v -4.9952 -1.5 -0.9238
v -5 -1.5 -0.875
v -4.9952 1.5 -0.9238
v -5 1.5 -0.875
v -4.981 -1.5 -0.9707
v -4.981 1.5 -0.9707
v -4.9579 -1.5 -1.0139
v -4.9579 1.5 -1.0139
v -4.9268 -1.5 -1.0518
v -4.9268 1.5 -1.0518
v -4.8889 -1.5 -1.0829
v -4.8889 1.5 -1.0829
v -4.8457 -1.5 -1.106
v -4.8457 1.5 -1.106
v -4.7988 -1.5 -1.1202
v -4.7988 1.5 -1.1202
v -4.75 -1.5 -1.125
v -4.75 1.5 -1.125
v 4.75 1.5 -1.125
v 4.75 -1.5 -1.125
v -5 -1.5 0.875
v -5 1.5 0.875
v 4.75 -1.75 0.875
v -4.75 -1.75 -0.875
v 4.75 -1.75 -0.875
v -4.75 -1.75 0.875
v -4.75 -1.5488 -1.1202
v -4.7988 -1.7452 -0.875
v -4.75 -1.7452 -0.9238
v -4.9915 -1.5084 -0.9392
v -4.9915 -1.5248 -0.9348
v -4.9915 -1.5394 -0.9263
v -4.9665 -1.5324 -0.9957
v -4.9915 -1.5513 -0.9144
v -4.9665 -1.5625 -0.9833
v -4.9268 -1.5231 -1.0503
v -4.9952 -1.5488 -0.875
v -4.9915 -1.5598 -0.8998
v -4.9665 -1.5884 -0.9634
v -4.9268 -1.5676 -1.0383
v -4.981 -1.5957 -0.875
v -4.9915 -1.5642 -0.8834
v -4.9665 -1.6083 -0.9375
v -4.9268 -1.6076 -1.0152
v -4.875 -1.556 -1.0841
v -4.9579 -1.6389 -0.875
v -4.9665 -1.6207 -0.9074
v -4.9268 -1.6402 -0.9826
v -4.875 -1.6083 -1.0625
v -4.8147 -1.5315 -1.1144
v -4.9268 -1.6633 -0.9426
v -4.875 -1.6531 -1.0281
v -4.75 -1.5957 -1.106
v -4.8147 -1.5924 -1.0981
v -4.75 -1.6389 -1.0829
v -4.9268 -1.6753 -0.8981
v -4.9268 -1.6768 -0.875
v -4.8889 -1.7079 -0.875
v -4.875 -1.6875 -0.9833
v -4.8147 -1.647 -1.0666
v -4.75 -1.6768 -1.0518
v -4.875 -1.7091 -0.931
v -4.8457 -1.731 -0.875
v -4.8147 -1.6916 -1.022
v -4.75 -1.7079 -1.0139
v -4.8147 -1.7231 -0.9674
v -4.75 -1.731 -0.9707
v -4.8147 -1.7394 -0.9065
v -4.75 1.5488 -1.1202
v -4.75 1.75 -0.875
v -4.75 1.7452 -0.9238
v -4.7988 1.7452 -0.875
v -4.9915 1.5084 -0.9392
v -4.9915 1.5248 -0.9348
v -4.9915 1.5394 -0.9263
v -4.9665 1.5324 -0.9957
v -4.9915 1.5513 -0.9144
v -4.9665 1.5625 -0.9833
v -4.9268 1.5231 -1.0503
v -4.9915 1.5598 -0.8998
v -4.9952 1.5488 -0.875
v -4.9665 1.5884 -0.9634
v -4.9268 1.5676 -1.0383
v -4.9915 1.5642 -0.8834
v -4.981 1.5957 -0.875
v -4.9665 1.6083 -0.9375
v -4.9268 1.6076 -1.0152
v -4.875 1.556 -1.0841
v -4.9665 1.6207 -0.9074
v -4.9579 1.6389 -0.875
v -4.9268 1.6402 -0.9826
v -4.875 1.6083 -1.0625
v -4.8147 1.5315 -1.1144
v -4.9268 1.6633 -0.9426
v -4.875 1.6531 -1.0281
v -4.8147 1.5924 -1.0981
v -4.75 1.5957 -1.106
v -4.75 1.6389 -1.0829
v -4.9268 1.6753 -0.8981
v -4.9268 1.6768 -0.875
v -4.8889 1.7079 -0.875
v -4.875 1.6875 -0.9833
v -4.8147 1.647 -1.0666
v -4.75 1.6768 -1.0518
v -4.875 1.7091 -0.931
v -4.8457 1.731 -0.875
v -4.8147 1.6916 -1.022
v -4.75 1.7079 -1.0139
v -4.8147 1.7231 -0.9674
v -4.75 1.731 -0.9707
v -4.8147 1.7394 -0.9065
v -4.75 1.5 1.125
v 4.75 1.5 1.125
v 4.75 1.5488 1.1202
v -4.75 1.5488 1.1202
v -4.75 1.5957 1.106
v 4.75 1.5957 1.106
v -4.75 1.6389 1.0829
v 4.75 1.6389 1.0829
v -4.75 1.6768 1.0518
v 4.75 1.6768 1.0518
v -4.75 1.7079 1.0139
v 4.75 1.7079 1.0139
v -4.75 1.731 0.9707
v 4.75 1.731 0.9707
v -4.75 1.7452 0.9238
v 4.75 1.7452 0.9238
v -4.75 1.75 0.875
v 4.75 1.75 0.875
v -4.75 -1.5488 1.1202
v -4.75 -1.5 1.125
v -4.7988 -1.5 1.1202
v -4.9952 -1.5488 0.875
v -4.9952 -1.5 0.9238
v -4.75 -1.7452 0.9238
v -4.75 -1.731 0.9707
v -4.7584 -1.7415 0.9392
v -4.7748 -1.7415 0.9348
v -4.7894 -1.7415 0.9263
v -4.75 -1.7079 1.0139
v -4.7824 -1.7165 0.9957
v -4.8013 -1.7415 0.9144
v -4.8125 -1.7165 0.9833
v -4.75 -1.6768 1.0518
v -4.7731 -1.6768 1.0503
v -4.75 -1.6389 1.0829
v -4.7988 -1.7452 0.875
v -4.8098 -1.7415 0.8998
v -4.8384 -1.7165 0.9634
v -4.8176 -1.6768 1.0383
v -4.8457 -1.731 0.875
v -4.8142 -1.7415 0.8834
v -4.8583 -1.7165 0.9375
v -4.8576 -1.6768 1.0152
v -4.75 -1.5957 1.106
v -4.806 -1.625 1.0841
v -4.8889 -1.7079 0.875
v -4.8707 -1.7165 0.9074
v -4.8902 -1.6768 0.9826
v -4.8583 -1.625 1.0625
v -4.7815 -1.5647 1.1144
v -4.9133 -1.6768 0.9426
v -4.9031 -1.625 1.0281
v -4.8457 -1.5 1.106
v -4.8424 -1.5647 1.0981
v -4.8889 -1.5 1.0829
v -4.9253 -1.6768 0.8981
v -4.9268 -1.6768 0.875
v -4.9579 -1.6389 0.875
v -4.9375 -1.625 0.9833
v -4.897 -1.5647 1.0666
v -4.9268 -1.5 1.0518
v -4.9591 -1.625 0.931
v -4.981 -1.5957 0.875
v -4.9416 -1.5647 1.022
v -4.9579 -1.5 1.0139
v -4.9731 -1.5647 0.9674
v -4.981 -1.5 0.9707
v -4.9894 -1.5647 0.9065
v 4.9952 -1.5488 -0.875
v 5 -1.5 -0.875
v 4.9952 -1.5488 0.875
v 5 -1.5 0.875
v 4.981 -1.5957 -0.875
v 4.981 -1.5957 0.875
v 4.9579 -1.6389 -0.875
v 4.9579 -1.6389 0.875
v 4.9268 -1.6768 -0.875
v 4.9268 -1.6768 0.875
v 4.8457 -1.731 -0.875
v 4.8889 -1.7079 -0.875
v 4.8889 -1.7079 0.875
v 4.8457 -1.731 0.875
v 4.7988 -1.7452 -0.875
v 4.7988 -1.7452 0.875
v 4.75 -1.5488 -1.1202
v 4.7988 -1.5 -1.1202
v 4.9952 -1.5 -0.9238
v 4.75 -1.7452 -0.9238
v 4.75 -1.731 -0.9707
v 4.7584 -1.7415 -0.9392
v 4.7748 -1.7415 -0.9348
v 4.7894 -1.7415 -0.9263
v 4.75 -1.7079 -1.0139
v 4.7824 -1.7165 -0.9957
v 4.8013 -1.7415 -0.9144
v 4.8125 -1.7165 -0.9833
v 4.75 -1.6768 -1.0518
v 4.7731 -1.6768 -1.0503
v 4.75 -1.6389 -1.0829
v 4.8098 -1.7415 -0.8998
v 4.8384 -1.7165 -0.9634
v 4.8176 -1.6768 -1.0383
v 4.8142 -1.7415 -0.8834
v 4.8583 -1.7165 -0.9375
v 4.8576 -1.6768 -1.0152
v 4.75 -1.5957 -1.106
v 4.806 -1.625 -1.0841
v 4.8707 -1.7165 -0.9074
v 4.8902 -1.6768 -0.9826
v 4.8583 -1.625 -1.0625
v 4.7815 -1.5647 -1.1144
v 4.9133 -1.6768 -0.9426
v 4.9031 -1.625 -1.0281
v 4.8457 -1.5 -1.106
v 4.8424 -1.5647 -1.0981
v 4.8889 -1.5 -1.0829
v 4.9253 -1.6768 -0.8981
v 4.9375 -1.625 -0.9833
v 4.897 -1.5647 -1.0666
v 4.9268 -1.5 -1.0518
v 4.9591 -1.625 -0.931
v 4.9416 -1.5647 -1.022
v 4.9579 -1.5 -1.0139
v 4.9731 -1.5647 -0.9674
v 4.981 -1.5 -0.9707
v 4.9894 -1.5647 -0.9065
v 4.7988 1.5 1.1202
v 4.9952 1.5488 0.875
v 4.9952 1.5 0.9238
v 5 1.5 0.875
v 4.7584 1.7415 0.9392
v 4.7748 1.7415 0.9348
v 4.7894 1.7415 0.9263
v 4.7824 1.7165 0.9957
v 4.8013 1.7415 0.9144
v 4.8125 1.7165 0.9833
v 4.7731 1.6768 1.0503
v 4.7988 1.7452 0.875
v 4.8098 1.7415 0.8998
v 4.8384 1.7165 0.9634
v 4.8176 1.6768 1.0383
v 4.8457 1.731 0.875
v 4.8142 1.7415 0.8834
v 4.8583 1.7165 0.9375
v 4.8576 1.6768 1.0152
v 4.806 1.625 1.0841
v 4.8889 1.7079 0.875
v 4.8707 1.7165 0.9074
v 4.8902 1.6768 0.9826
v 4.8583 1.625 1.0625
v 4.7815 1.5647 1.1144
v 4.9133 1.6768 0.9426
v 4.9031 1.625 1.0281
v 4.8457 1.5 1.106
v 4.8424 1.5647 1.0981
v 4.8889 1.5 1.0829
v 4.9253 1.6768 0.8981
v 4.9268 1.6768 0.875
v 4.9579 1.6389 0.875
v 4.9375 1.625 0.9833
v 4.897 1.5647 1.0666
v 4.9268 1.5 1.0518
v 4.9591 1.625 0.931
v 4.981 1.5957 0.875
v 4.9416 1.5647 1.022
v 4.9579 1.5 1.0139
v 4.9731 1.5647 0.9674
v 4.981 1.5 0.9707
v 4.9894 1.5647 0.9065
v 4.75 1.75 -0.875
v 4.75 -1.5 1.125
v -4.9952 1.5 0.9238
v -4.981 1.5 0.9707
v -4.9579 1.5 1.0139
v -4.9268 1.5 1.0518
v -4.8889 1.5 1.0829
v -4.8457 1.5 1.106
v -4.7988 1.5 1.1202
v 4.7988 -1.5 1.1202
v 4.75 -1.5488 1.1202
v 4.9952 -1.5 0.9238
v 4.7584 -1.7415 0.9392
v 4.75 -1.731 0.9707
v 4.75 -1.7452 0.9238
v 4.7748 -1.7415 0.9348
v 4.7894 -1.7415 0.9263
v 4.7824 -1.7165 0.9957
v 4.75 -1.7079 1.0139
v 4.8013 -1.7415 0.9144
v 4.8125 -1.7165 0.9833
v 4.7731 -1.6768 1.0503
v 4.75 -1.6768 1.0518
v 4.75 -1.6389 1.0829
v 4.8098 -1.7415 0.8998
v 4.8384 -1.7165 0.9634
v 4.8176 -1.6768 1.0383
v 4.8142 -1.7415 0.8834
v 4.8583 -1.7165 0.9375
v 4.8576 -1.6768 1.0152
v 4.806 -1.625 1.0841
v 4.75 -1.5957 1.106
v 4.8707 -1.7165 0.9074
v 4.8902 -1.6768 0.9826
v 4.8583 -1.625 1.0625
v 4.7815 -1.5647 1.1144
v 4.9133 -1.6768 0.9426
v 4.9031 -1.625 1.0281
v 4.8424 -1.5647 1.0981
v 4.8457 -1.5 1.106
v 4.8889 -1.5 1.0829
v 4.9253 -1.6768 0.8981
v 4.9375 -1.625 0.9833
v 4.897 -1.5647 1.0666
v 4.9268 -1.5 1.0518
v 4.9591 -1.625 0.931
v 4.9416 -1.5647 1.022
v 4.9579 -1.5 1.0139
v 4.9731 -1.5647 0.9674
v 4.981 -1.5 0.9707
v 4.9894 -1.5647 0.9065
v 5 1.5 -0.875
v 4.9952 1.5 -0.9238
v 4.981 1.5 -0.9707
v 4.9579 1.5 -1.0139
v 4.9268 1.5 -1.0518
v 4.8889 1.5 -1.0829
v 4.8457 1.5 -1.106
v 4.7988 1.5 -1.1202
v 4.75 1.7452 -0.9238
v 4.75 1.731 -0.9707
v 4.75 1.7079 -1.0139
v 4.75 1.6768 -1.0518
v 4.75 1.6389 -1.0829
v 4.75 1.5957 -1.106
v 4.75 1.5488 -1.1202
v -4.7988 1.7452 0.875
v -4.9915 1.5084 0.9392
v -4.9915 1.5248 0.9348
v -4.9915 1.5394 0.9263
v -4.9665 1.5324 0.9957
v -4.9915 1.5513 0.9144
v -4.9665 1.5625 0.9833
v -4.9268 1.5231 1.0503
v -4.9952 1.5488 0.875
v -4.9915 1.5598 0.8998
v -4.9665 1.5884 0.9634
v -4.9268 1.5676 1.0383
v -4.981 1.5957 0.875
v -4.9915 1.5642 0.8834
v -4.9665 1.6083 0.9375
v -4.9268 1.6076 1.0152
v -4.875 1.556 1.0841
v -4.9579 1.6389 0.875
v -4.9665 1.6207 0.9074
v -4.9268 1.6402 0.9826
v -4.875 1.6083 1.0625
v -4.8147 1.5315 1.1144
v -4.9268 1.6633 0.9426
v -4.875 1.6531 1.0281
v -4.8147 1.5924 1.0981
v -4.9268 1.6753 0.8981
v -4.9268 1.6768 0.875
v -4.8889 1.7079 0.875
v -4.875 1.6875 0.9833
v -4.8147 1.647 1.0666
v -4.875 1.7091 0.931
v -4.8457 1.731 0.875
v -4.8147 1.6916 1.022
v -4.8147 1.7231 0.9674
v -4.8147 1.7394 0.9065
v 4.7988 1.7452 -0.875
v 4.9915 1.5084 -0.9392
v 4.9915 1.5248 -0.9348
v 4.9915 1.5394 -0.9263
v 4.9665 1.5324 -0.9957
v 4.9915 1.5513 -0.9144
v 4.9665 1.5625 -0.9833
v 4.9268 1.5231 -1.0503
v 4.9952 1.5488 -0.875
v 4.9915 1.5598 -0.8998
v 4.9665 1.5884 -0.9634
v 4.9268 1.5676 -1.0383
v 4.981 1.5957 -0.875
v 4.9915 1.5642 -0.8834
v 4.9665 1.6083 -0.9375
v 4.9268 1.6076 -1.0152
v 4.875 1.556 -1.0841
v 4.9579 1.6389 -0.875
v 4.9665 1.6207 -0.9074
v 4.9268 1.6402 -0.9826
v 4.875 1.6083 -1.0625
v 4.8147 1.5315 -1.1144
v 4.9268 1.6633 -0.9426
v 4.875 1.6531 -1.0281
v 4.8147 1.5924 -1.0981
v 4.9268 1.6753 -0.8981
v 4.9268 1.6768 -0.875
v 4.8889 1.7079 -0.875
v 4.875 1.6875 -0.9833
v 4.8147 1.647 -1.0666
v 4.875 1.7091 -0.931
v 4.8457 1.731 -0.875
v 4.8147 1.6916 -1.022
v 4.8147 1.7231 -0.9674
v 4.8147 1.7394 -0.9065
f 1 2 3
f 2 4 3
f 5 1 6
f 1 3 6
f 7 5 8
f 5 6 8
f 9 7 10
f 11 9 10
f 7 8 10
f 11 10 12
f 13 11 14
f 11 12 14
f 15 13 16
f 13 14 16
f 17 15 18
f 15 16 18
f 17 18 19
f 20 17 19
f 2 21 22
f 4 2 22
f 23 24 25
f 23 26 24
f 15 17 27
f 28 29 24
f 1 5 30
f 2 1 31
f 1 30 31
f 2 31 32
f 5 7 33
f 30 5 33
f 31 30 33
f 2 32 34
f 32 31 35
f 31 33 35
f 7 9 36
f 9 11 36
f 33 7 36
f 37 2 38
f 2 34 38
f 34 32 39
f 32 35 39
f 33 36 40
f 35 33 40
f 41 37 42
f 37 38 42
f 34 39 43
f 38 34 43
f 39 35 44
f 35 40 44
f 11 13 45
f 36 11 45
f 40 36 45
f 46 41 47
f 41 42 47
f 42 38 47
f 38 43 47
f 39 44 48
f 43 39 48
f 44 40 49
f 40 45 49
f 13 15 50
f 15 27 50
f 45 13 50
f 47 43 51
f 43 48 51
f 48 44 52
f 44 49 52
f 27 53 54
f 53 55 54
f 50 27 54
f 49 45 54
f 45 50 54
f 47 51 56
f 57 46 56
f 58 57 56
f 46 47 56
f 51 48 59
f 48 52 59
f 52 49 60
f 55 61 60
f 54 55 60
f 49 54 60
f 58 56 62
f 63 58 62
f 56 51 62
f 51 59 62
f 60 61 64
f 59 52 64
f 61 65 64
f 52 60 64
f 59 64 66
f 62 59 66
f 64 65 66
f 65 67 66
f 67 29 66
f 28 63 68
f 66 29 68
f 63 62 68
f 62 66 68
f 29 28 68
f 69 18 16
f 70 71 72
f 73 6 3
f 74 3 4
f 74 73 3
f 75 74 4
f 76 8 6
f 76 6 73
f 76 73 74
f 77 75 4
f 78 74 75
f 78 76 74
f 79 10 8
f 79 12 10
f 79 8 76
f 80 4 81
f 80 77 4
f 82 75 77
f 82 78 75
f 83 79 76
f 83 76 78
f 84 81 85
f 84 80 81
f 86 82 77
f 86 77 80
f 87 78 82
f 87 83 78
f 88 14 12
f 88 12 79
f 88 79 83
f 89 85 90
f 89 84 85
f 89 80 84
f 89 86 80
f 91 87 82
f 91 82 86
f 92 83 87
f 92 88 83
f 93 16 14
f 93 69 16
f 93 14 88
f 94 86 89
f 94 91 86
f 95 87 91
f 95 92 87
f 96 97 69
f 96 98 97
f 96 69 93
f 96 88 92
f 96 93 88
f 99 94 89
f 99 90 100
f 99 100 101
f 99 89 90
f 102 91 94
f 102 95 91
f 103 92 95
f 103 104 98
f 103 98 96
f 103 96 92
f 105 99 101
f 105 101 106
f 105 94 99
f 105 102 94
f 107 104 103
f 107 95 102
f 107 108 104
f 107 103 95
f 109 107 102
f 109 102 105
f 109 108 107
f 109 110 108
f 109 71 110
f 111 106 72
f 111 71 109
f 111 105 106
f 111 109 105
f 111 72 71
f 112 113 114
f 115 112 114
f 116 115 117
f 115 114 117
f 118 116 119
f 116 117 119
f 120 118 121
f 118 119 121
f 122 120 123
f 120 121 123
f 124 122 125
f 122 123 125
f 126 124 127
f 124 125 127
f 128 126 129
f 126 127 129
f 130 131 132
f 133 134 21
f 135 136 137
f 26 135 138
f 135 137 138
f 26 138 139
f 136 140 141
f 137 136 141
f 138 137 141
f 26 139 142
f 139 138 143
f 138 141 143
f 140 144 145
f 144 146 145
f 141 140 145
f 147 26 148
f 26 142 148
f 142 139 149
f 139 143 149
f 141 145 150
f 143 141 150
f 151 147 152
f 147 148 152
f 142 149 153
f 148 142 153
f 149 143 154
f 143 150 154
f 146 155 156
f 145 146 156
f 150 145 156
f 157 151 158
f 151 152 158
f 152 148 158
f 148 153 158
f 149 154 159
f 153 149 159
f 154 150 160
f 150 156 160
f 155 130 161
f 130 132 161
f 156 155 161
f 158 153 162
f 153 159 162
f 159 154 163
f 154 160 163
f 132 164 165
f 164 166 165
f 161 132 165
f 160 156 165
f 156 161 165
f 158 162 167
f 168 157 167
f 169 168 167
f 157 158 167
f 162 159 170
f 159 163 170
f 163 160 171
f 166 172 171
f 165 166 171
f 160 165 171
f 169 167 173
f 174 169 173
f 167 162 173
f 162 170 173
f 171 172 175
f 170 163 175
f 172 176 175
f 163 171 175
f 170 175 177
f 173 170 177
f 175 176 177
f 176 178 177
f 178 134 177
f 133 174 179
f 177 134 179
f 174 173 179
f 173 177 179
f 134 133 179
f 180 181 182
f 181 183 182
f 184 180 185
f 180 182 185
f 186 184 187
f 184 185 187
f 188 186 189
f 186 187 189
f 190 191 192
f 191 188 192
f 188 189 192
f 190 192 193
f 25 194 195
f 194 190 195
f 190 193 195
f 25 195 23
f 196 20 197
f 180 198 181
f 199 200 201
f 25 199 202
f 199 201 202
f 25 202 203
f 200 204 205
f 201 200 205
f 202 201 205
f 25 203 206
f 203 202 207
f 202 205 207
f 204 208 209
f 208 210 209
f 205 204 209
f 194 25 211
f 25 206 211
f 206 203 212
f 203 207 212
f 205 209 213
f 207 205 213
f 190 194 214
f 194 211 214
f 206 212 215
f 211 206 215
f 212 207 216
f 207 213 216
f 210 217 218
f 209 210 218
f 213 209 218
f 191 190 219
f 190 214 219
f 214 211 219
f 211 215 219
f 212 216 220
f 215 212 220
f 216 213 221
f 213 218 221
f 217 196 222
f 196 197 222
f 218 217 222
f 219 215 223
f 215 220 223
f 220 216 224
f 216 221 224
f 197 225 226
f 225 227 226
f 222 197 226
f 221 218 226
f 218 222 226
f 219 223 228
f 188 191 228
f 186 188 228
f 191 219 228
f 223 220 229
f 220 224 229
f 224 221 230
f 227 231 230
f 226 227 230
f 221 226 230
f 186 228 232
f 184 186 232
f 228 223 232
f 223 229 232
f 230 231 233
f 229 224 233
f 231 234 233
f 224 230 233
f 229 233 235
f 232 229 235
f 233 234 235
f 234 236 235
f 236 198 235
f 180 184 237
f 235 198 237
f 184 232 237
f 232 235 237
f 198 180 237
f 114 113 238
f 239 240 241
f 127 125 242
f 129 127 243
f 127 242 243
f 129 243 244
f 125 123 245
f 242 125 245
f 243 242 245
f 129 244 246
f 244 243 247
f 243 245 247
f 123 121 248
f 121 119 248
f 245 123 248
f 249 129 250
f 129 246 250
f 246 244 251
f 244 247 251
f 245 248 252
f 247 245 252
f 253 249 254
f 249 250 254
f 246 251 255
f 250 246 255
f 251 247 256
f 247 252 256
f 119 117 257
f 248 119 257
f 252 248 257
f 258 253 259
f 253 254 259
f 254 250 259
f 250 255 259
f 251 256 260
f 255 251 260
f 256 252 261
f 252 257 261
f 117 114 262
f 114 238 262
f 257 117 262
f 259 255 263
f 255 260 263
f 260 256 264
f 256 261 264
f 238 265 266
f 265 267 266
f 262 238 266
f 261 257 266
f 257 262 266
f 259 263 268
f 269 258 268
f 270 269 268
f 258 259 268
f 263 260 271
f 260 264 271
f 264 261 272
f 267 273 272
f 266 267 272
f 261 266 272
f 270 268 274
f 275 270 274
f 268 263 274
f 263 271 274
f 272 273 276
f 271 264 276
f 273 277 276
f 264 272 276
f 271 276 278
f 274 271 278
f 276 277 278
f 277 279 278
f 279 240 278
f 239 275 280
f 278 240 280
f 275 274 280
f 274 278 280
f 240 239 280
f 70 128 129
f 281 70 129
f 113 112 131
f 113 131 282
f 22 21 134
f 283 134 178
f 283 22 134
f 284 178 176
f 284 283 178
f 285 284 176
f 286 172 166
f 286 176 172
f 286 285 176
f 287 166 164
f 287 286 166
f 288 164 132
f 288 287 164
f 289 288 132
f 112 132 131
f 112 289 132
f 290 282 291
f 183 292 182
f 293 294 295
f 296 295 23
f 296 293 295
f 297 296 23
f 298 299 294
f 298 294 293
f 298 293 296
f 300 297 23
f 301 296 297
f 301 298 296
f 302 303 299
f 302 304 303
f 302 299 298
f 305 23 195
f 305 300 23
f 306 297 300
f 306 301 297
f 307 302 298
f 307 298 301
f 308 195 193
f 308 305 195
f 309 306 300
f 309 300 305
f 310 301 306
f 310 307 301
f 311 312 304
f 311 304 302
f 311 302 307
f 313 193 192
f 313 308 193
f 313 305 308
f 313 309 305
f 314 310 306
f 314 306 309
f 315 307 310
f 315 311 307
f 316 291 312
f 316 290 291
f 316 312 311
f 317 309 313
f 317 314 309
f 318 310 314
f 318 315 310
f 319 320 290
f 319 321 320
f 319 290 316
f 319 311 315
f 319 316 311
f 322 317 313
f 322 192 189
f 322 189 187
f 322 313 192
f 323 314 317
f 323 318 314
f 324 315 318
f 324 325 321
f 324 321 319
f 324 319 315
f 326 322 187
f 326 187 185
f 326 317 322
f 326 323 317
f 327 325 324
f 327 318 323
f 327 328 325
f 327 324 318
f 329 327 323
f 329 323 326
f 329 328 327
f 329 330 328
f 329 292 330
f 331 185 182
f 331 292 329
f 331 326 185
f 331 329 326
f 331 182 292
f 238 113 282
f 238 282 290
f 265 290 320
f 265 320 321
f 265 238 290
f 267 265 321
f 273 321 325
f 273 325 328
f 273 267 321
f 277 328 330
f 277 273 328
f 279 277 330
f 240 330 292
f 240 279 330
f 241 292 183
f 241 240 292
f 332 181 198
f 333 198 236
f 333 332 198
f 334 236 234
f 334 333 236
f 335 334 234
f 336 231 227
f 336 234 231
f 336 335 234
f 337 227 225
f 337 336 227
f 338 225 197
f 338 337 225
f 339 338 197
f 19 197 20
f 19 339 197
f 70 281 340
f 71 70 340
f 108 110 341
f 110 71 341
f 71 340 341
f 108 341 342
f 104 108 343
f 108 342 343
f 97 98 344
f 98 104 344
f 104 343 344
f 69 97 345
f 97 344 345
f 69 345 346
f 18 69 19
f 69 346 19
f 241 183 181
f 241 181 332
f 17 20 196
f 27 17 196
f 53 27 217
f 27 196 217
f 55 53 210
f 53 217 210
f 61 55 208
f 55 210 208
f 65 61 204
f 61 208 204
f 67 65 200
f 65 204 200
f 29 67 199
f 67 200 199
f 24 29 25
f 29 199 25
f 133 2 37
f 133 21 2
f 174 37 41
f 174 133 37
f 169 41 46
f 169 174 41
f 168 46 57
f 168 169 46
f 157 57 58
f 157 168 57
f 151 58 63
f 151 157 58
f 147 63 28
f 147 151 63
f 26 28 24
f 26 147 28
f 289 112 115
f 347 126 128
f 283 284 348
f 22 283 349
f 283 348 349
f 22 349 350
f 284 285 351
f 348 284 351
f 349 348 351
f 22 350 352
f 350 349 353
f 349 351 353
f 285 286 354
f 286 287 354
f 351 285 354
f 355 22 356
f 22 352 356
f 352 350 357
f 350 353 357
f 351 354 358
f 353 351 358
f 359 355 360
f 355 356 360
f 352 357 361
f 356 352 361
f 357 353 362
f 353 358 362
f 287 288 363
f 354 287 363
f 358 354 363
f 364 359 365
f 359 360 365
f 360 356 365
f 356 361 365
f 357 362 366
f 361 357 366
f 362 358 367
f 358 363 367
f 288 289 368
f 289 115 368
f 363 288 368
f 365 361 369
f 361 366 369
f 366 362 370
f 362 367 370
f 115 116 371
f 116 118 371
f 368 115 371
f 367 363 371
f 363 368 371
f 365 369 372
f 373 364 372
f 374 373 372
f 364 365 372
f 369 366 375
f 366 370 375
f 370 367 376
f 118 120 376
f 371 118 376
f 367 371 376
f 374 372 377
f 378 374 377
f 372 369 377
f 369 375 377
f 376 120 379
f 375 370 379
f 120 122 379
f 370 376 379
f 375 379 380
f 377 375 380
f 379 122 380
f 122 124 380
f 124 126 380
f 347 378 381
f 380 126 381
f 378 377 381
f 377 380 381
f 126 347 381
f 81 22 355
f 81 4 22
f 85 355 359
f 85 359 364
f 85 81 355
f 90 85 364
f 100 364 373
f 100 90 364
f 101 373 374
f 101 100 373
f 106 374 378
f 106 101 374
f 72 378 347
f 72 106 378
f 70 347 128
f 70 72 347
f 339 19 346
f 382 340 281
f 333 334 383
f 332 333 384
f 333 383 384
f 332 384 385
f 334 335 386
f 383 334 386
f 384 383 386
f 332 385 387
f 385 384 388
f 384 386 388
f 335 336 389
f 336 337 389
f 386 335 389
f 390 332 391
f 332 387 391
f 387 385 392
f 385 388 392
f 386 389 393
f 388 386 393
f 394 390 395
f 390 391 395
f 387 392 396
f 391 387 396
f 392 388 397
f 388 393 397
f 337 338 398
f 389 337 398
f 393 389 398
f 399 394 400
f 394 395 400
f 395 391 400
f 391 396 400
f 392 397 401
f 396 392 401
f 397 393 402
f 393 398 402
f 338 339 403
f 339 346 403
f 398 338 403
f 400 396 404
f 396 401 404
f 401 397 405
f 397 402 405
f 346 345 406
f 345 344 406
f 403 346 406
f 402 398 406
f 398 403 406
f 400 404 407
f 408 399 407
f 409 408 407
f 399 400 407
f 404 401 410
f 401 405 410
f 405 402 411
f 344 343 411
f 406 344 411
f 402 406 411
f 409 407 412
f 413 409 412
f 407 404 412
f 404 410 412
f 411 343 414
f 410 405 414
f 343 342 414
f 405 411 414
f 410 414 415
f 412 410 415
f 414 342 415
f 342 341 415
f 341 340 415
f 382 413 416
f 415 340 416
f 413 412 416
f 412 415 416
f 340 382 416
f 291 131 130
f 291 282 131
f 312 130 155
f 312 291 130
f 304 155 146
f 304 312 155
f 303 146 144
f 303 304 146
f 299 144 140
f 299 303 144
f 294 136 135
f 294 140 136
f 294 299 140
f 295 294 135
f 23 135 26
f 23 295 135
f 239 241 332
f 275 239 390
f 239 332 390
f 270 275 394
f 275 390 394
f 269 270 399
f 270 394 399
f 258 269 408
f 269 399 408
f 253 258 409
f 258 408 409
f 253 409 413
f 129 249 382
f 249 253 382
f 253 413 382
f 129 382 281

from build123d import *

# Parameters (mm, degrees)
SKETCH1_W      = 10
SKETCH1_H      = 3.5
EXTRUDE1_DEPTH = 1.125
FILLET1_R      = 0.25


with BuildPart() as part:
    # Sketch1 → Extrude1 (new, symmetric)
    with BuildSketch(Plane.XY):
        Rectangle(SKETCH1_W, SKETCH1_H)
    extrude(amount=EXTRUDE1_DEPTH, both=True)

    # Fillet1
    fillet1_edges = [part.edges().sort_by_distance(p)[0] for p in [
        (5, 0, 1.125),
        (0, 1.75, 1.125),
        (-5, 0, 1.125),
        (0, 1.75, -1.125),
        (5, 0, -1.125),
        (0, -1.75, -1.125),
        (-5, 0, -1.125),
        (0, -1.75, 1.125),
        (-5, 1.75, 0),
        (5, 1.75, 0),
        (5, -1.75, 0),
        (-5, -1.75, 0),
    ]]
    fillet(fillet1_edges, radius=FILLET1_R)


solid = part.part
